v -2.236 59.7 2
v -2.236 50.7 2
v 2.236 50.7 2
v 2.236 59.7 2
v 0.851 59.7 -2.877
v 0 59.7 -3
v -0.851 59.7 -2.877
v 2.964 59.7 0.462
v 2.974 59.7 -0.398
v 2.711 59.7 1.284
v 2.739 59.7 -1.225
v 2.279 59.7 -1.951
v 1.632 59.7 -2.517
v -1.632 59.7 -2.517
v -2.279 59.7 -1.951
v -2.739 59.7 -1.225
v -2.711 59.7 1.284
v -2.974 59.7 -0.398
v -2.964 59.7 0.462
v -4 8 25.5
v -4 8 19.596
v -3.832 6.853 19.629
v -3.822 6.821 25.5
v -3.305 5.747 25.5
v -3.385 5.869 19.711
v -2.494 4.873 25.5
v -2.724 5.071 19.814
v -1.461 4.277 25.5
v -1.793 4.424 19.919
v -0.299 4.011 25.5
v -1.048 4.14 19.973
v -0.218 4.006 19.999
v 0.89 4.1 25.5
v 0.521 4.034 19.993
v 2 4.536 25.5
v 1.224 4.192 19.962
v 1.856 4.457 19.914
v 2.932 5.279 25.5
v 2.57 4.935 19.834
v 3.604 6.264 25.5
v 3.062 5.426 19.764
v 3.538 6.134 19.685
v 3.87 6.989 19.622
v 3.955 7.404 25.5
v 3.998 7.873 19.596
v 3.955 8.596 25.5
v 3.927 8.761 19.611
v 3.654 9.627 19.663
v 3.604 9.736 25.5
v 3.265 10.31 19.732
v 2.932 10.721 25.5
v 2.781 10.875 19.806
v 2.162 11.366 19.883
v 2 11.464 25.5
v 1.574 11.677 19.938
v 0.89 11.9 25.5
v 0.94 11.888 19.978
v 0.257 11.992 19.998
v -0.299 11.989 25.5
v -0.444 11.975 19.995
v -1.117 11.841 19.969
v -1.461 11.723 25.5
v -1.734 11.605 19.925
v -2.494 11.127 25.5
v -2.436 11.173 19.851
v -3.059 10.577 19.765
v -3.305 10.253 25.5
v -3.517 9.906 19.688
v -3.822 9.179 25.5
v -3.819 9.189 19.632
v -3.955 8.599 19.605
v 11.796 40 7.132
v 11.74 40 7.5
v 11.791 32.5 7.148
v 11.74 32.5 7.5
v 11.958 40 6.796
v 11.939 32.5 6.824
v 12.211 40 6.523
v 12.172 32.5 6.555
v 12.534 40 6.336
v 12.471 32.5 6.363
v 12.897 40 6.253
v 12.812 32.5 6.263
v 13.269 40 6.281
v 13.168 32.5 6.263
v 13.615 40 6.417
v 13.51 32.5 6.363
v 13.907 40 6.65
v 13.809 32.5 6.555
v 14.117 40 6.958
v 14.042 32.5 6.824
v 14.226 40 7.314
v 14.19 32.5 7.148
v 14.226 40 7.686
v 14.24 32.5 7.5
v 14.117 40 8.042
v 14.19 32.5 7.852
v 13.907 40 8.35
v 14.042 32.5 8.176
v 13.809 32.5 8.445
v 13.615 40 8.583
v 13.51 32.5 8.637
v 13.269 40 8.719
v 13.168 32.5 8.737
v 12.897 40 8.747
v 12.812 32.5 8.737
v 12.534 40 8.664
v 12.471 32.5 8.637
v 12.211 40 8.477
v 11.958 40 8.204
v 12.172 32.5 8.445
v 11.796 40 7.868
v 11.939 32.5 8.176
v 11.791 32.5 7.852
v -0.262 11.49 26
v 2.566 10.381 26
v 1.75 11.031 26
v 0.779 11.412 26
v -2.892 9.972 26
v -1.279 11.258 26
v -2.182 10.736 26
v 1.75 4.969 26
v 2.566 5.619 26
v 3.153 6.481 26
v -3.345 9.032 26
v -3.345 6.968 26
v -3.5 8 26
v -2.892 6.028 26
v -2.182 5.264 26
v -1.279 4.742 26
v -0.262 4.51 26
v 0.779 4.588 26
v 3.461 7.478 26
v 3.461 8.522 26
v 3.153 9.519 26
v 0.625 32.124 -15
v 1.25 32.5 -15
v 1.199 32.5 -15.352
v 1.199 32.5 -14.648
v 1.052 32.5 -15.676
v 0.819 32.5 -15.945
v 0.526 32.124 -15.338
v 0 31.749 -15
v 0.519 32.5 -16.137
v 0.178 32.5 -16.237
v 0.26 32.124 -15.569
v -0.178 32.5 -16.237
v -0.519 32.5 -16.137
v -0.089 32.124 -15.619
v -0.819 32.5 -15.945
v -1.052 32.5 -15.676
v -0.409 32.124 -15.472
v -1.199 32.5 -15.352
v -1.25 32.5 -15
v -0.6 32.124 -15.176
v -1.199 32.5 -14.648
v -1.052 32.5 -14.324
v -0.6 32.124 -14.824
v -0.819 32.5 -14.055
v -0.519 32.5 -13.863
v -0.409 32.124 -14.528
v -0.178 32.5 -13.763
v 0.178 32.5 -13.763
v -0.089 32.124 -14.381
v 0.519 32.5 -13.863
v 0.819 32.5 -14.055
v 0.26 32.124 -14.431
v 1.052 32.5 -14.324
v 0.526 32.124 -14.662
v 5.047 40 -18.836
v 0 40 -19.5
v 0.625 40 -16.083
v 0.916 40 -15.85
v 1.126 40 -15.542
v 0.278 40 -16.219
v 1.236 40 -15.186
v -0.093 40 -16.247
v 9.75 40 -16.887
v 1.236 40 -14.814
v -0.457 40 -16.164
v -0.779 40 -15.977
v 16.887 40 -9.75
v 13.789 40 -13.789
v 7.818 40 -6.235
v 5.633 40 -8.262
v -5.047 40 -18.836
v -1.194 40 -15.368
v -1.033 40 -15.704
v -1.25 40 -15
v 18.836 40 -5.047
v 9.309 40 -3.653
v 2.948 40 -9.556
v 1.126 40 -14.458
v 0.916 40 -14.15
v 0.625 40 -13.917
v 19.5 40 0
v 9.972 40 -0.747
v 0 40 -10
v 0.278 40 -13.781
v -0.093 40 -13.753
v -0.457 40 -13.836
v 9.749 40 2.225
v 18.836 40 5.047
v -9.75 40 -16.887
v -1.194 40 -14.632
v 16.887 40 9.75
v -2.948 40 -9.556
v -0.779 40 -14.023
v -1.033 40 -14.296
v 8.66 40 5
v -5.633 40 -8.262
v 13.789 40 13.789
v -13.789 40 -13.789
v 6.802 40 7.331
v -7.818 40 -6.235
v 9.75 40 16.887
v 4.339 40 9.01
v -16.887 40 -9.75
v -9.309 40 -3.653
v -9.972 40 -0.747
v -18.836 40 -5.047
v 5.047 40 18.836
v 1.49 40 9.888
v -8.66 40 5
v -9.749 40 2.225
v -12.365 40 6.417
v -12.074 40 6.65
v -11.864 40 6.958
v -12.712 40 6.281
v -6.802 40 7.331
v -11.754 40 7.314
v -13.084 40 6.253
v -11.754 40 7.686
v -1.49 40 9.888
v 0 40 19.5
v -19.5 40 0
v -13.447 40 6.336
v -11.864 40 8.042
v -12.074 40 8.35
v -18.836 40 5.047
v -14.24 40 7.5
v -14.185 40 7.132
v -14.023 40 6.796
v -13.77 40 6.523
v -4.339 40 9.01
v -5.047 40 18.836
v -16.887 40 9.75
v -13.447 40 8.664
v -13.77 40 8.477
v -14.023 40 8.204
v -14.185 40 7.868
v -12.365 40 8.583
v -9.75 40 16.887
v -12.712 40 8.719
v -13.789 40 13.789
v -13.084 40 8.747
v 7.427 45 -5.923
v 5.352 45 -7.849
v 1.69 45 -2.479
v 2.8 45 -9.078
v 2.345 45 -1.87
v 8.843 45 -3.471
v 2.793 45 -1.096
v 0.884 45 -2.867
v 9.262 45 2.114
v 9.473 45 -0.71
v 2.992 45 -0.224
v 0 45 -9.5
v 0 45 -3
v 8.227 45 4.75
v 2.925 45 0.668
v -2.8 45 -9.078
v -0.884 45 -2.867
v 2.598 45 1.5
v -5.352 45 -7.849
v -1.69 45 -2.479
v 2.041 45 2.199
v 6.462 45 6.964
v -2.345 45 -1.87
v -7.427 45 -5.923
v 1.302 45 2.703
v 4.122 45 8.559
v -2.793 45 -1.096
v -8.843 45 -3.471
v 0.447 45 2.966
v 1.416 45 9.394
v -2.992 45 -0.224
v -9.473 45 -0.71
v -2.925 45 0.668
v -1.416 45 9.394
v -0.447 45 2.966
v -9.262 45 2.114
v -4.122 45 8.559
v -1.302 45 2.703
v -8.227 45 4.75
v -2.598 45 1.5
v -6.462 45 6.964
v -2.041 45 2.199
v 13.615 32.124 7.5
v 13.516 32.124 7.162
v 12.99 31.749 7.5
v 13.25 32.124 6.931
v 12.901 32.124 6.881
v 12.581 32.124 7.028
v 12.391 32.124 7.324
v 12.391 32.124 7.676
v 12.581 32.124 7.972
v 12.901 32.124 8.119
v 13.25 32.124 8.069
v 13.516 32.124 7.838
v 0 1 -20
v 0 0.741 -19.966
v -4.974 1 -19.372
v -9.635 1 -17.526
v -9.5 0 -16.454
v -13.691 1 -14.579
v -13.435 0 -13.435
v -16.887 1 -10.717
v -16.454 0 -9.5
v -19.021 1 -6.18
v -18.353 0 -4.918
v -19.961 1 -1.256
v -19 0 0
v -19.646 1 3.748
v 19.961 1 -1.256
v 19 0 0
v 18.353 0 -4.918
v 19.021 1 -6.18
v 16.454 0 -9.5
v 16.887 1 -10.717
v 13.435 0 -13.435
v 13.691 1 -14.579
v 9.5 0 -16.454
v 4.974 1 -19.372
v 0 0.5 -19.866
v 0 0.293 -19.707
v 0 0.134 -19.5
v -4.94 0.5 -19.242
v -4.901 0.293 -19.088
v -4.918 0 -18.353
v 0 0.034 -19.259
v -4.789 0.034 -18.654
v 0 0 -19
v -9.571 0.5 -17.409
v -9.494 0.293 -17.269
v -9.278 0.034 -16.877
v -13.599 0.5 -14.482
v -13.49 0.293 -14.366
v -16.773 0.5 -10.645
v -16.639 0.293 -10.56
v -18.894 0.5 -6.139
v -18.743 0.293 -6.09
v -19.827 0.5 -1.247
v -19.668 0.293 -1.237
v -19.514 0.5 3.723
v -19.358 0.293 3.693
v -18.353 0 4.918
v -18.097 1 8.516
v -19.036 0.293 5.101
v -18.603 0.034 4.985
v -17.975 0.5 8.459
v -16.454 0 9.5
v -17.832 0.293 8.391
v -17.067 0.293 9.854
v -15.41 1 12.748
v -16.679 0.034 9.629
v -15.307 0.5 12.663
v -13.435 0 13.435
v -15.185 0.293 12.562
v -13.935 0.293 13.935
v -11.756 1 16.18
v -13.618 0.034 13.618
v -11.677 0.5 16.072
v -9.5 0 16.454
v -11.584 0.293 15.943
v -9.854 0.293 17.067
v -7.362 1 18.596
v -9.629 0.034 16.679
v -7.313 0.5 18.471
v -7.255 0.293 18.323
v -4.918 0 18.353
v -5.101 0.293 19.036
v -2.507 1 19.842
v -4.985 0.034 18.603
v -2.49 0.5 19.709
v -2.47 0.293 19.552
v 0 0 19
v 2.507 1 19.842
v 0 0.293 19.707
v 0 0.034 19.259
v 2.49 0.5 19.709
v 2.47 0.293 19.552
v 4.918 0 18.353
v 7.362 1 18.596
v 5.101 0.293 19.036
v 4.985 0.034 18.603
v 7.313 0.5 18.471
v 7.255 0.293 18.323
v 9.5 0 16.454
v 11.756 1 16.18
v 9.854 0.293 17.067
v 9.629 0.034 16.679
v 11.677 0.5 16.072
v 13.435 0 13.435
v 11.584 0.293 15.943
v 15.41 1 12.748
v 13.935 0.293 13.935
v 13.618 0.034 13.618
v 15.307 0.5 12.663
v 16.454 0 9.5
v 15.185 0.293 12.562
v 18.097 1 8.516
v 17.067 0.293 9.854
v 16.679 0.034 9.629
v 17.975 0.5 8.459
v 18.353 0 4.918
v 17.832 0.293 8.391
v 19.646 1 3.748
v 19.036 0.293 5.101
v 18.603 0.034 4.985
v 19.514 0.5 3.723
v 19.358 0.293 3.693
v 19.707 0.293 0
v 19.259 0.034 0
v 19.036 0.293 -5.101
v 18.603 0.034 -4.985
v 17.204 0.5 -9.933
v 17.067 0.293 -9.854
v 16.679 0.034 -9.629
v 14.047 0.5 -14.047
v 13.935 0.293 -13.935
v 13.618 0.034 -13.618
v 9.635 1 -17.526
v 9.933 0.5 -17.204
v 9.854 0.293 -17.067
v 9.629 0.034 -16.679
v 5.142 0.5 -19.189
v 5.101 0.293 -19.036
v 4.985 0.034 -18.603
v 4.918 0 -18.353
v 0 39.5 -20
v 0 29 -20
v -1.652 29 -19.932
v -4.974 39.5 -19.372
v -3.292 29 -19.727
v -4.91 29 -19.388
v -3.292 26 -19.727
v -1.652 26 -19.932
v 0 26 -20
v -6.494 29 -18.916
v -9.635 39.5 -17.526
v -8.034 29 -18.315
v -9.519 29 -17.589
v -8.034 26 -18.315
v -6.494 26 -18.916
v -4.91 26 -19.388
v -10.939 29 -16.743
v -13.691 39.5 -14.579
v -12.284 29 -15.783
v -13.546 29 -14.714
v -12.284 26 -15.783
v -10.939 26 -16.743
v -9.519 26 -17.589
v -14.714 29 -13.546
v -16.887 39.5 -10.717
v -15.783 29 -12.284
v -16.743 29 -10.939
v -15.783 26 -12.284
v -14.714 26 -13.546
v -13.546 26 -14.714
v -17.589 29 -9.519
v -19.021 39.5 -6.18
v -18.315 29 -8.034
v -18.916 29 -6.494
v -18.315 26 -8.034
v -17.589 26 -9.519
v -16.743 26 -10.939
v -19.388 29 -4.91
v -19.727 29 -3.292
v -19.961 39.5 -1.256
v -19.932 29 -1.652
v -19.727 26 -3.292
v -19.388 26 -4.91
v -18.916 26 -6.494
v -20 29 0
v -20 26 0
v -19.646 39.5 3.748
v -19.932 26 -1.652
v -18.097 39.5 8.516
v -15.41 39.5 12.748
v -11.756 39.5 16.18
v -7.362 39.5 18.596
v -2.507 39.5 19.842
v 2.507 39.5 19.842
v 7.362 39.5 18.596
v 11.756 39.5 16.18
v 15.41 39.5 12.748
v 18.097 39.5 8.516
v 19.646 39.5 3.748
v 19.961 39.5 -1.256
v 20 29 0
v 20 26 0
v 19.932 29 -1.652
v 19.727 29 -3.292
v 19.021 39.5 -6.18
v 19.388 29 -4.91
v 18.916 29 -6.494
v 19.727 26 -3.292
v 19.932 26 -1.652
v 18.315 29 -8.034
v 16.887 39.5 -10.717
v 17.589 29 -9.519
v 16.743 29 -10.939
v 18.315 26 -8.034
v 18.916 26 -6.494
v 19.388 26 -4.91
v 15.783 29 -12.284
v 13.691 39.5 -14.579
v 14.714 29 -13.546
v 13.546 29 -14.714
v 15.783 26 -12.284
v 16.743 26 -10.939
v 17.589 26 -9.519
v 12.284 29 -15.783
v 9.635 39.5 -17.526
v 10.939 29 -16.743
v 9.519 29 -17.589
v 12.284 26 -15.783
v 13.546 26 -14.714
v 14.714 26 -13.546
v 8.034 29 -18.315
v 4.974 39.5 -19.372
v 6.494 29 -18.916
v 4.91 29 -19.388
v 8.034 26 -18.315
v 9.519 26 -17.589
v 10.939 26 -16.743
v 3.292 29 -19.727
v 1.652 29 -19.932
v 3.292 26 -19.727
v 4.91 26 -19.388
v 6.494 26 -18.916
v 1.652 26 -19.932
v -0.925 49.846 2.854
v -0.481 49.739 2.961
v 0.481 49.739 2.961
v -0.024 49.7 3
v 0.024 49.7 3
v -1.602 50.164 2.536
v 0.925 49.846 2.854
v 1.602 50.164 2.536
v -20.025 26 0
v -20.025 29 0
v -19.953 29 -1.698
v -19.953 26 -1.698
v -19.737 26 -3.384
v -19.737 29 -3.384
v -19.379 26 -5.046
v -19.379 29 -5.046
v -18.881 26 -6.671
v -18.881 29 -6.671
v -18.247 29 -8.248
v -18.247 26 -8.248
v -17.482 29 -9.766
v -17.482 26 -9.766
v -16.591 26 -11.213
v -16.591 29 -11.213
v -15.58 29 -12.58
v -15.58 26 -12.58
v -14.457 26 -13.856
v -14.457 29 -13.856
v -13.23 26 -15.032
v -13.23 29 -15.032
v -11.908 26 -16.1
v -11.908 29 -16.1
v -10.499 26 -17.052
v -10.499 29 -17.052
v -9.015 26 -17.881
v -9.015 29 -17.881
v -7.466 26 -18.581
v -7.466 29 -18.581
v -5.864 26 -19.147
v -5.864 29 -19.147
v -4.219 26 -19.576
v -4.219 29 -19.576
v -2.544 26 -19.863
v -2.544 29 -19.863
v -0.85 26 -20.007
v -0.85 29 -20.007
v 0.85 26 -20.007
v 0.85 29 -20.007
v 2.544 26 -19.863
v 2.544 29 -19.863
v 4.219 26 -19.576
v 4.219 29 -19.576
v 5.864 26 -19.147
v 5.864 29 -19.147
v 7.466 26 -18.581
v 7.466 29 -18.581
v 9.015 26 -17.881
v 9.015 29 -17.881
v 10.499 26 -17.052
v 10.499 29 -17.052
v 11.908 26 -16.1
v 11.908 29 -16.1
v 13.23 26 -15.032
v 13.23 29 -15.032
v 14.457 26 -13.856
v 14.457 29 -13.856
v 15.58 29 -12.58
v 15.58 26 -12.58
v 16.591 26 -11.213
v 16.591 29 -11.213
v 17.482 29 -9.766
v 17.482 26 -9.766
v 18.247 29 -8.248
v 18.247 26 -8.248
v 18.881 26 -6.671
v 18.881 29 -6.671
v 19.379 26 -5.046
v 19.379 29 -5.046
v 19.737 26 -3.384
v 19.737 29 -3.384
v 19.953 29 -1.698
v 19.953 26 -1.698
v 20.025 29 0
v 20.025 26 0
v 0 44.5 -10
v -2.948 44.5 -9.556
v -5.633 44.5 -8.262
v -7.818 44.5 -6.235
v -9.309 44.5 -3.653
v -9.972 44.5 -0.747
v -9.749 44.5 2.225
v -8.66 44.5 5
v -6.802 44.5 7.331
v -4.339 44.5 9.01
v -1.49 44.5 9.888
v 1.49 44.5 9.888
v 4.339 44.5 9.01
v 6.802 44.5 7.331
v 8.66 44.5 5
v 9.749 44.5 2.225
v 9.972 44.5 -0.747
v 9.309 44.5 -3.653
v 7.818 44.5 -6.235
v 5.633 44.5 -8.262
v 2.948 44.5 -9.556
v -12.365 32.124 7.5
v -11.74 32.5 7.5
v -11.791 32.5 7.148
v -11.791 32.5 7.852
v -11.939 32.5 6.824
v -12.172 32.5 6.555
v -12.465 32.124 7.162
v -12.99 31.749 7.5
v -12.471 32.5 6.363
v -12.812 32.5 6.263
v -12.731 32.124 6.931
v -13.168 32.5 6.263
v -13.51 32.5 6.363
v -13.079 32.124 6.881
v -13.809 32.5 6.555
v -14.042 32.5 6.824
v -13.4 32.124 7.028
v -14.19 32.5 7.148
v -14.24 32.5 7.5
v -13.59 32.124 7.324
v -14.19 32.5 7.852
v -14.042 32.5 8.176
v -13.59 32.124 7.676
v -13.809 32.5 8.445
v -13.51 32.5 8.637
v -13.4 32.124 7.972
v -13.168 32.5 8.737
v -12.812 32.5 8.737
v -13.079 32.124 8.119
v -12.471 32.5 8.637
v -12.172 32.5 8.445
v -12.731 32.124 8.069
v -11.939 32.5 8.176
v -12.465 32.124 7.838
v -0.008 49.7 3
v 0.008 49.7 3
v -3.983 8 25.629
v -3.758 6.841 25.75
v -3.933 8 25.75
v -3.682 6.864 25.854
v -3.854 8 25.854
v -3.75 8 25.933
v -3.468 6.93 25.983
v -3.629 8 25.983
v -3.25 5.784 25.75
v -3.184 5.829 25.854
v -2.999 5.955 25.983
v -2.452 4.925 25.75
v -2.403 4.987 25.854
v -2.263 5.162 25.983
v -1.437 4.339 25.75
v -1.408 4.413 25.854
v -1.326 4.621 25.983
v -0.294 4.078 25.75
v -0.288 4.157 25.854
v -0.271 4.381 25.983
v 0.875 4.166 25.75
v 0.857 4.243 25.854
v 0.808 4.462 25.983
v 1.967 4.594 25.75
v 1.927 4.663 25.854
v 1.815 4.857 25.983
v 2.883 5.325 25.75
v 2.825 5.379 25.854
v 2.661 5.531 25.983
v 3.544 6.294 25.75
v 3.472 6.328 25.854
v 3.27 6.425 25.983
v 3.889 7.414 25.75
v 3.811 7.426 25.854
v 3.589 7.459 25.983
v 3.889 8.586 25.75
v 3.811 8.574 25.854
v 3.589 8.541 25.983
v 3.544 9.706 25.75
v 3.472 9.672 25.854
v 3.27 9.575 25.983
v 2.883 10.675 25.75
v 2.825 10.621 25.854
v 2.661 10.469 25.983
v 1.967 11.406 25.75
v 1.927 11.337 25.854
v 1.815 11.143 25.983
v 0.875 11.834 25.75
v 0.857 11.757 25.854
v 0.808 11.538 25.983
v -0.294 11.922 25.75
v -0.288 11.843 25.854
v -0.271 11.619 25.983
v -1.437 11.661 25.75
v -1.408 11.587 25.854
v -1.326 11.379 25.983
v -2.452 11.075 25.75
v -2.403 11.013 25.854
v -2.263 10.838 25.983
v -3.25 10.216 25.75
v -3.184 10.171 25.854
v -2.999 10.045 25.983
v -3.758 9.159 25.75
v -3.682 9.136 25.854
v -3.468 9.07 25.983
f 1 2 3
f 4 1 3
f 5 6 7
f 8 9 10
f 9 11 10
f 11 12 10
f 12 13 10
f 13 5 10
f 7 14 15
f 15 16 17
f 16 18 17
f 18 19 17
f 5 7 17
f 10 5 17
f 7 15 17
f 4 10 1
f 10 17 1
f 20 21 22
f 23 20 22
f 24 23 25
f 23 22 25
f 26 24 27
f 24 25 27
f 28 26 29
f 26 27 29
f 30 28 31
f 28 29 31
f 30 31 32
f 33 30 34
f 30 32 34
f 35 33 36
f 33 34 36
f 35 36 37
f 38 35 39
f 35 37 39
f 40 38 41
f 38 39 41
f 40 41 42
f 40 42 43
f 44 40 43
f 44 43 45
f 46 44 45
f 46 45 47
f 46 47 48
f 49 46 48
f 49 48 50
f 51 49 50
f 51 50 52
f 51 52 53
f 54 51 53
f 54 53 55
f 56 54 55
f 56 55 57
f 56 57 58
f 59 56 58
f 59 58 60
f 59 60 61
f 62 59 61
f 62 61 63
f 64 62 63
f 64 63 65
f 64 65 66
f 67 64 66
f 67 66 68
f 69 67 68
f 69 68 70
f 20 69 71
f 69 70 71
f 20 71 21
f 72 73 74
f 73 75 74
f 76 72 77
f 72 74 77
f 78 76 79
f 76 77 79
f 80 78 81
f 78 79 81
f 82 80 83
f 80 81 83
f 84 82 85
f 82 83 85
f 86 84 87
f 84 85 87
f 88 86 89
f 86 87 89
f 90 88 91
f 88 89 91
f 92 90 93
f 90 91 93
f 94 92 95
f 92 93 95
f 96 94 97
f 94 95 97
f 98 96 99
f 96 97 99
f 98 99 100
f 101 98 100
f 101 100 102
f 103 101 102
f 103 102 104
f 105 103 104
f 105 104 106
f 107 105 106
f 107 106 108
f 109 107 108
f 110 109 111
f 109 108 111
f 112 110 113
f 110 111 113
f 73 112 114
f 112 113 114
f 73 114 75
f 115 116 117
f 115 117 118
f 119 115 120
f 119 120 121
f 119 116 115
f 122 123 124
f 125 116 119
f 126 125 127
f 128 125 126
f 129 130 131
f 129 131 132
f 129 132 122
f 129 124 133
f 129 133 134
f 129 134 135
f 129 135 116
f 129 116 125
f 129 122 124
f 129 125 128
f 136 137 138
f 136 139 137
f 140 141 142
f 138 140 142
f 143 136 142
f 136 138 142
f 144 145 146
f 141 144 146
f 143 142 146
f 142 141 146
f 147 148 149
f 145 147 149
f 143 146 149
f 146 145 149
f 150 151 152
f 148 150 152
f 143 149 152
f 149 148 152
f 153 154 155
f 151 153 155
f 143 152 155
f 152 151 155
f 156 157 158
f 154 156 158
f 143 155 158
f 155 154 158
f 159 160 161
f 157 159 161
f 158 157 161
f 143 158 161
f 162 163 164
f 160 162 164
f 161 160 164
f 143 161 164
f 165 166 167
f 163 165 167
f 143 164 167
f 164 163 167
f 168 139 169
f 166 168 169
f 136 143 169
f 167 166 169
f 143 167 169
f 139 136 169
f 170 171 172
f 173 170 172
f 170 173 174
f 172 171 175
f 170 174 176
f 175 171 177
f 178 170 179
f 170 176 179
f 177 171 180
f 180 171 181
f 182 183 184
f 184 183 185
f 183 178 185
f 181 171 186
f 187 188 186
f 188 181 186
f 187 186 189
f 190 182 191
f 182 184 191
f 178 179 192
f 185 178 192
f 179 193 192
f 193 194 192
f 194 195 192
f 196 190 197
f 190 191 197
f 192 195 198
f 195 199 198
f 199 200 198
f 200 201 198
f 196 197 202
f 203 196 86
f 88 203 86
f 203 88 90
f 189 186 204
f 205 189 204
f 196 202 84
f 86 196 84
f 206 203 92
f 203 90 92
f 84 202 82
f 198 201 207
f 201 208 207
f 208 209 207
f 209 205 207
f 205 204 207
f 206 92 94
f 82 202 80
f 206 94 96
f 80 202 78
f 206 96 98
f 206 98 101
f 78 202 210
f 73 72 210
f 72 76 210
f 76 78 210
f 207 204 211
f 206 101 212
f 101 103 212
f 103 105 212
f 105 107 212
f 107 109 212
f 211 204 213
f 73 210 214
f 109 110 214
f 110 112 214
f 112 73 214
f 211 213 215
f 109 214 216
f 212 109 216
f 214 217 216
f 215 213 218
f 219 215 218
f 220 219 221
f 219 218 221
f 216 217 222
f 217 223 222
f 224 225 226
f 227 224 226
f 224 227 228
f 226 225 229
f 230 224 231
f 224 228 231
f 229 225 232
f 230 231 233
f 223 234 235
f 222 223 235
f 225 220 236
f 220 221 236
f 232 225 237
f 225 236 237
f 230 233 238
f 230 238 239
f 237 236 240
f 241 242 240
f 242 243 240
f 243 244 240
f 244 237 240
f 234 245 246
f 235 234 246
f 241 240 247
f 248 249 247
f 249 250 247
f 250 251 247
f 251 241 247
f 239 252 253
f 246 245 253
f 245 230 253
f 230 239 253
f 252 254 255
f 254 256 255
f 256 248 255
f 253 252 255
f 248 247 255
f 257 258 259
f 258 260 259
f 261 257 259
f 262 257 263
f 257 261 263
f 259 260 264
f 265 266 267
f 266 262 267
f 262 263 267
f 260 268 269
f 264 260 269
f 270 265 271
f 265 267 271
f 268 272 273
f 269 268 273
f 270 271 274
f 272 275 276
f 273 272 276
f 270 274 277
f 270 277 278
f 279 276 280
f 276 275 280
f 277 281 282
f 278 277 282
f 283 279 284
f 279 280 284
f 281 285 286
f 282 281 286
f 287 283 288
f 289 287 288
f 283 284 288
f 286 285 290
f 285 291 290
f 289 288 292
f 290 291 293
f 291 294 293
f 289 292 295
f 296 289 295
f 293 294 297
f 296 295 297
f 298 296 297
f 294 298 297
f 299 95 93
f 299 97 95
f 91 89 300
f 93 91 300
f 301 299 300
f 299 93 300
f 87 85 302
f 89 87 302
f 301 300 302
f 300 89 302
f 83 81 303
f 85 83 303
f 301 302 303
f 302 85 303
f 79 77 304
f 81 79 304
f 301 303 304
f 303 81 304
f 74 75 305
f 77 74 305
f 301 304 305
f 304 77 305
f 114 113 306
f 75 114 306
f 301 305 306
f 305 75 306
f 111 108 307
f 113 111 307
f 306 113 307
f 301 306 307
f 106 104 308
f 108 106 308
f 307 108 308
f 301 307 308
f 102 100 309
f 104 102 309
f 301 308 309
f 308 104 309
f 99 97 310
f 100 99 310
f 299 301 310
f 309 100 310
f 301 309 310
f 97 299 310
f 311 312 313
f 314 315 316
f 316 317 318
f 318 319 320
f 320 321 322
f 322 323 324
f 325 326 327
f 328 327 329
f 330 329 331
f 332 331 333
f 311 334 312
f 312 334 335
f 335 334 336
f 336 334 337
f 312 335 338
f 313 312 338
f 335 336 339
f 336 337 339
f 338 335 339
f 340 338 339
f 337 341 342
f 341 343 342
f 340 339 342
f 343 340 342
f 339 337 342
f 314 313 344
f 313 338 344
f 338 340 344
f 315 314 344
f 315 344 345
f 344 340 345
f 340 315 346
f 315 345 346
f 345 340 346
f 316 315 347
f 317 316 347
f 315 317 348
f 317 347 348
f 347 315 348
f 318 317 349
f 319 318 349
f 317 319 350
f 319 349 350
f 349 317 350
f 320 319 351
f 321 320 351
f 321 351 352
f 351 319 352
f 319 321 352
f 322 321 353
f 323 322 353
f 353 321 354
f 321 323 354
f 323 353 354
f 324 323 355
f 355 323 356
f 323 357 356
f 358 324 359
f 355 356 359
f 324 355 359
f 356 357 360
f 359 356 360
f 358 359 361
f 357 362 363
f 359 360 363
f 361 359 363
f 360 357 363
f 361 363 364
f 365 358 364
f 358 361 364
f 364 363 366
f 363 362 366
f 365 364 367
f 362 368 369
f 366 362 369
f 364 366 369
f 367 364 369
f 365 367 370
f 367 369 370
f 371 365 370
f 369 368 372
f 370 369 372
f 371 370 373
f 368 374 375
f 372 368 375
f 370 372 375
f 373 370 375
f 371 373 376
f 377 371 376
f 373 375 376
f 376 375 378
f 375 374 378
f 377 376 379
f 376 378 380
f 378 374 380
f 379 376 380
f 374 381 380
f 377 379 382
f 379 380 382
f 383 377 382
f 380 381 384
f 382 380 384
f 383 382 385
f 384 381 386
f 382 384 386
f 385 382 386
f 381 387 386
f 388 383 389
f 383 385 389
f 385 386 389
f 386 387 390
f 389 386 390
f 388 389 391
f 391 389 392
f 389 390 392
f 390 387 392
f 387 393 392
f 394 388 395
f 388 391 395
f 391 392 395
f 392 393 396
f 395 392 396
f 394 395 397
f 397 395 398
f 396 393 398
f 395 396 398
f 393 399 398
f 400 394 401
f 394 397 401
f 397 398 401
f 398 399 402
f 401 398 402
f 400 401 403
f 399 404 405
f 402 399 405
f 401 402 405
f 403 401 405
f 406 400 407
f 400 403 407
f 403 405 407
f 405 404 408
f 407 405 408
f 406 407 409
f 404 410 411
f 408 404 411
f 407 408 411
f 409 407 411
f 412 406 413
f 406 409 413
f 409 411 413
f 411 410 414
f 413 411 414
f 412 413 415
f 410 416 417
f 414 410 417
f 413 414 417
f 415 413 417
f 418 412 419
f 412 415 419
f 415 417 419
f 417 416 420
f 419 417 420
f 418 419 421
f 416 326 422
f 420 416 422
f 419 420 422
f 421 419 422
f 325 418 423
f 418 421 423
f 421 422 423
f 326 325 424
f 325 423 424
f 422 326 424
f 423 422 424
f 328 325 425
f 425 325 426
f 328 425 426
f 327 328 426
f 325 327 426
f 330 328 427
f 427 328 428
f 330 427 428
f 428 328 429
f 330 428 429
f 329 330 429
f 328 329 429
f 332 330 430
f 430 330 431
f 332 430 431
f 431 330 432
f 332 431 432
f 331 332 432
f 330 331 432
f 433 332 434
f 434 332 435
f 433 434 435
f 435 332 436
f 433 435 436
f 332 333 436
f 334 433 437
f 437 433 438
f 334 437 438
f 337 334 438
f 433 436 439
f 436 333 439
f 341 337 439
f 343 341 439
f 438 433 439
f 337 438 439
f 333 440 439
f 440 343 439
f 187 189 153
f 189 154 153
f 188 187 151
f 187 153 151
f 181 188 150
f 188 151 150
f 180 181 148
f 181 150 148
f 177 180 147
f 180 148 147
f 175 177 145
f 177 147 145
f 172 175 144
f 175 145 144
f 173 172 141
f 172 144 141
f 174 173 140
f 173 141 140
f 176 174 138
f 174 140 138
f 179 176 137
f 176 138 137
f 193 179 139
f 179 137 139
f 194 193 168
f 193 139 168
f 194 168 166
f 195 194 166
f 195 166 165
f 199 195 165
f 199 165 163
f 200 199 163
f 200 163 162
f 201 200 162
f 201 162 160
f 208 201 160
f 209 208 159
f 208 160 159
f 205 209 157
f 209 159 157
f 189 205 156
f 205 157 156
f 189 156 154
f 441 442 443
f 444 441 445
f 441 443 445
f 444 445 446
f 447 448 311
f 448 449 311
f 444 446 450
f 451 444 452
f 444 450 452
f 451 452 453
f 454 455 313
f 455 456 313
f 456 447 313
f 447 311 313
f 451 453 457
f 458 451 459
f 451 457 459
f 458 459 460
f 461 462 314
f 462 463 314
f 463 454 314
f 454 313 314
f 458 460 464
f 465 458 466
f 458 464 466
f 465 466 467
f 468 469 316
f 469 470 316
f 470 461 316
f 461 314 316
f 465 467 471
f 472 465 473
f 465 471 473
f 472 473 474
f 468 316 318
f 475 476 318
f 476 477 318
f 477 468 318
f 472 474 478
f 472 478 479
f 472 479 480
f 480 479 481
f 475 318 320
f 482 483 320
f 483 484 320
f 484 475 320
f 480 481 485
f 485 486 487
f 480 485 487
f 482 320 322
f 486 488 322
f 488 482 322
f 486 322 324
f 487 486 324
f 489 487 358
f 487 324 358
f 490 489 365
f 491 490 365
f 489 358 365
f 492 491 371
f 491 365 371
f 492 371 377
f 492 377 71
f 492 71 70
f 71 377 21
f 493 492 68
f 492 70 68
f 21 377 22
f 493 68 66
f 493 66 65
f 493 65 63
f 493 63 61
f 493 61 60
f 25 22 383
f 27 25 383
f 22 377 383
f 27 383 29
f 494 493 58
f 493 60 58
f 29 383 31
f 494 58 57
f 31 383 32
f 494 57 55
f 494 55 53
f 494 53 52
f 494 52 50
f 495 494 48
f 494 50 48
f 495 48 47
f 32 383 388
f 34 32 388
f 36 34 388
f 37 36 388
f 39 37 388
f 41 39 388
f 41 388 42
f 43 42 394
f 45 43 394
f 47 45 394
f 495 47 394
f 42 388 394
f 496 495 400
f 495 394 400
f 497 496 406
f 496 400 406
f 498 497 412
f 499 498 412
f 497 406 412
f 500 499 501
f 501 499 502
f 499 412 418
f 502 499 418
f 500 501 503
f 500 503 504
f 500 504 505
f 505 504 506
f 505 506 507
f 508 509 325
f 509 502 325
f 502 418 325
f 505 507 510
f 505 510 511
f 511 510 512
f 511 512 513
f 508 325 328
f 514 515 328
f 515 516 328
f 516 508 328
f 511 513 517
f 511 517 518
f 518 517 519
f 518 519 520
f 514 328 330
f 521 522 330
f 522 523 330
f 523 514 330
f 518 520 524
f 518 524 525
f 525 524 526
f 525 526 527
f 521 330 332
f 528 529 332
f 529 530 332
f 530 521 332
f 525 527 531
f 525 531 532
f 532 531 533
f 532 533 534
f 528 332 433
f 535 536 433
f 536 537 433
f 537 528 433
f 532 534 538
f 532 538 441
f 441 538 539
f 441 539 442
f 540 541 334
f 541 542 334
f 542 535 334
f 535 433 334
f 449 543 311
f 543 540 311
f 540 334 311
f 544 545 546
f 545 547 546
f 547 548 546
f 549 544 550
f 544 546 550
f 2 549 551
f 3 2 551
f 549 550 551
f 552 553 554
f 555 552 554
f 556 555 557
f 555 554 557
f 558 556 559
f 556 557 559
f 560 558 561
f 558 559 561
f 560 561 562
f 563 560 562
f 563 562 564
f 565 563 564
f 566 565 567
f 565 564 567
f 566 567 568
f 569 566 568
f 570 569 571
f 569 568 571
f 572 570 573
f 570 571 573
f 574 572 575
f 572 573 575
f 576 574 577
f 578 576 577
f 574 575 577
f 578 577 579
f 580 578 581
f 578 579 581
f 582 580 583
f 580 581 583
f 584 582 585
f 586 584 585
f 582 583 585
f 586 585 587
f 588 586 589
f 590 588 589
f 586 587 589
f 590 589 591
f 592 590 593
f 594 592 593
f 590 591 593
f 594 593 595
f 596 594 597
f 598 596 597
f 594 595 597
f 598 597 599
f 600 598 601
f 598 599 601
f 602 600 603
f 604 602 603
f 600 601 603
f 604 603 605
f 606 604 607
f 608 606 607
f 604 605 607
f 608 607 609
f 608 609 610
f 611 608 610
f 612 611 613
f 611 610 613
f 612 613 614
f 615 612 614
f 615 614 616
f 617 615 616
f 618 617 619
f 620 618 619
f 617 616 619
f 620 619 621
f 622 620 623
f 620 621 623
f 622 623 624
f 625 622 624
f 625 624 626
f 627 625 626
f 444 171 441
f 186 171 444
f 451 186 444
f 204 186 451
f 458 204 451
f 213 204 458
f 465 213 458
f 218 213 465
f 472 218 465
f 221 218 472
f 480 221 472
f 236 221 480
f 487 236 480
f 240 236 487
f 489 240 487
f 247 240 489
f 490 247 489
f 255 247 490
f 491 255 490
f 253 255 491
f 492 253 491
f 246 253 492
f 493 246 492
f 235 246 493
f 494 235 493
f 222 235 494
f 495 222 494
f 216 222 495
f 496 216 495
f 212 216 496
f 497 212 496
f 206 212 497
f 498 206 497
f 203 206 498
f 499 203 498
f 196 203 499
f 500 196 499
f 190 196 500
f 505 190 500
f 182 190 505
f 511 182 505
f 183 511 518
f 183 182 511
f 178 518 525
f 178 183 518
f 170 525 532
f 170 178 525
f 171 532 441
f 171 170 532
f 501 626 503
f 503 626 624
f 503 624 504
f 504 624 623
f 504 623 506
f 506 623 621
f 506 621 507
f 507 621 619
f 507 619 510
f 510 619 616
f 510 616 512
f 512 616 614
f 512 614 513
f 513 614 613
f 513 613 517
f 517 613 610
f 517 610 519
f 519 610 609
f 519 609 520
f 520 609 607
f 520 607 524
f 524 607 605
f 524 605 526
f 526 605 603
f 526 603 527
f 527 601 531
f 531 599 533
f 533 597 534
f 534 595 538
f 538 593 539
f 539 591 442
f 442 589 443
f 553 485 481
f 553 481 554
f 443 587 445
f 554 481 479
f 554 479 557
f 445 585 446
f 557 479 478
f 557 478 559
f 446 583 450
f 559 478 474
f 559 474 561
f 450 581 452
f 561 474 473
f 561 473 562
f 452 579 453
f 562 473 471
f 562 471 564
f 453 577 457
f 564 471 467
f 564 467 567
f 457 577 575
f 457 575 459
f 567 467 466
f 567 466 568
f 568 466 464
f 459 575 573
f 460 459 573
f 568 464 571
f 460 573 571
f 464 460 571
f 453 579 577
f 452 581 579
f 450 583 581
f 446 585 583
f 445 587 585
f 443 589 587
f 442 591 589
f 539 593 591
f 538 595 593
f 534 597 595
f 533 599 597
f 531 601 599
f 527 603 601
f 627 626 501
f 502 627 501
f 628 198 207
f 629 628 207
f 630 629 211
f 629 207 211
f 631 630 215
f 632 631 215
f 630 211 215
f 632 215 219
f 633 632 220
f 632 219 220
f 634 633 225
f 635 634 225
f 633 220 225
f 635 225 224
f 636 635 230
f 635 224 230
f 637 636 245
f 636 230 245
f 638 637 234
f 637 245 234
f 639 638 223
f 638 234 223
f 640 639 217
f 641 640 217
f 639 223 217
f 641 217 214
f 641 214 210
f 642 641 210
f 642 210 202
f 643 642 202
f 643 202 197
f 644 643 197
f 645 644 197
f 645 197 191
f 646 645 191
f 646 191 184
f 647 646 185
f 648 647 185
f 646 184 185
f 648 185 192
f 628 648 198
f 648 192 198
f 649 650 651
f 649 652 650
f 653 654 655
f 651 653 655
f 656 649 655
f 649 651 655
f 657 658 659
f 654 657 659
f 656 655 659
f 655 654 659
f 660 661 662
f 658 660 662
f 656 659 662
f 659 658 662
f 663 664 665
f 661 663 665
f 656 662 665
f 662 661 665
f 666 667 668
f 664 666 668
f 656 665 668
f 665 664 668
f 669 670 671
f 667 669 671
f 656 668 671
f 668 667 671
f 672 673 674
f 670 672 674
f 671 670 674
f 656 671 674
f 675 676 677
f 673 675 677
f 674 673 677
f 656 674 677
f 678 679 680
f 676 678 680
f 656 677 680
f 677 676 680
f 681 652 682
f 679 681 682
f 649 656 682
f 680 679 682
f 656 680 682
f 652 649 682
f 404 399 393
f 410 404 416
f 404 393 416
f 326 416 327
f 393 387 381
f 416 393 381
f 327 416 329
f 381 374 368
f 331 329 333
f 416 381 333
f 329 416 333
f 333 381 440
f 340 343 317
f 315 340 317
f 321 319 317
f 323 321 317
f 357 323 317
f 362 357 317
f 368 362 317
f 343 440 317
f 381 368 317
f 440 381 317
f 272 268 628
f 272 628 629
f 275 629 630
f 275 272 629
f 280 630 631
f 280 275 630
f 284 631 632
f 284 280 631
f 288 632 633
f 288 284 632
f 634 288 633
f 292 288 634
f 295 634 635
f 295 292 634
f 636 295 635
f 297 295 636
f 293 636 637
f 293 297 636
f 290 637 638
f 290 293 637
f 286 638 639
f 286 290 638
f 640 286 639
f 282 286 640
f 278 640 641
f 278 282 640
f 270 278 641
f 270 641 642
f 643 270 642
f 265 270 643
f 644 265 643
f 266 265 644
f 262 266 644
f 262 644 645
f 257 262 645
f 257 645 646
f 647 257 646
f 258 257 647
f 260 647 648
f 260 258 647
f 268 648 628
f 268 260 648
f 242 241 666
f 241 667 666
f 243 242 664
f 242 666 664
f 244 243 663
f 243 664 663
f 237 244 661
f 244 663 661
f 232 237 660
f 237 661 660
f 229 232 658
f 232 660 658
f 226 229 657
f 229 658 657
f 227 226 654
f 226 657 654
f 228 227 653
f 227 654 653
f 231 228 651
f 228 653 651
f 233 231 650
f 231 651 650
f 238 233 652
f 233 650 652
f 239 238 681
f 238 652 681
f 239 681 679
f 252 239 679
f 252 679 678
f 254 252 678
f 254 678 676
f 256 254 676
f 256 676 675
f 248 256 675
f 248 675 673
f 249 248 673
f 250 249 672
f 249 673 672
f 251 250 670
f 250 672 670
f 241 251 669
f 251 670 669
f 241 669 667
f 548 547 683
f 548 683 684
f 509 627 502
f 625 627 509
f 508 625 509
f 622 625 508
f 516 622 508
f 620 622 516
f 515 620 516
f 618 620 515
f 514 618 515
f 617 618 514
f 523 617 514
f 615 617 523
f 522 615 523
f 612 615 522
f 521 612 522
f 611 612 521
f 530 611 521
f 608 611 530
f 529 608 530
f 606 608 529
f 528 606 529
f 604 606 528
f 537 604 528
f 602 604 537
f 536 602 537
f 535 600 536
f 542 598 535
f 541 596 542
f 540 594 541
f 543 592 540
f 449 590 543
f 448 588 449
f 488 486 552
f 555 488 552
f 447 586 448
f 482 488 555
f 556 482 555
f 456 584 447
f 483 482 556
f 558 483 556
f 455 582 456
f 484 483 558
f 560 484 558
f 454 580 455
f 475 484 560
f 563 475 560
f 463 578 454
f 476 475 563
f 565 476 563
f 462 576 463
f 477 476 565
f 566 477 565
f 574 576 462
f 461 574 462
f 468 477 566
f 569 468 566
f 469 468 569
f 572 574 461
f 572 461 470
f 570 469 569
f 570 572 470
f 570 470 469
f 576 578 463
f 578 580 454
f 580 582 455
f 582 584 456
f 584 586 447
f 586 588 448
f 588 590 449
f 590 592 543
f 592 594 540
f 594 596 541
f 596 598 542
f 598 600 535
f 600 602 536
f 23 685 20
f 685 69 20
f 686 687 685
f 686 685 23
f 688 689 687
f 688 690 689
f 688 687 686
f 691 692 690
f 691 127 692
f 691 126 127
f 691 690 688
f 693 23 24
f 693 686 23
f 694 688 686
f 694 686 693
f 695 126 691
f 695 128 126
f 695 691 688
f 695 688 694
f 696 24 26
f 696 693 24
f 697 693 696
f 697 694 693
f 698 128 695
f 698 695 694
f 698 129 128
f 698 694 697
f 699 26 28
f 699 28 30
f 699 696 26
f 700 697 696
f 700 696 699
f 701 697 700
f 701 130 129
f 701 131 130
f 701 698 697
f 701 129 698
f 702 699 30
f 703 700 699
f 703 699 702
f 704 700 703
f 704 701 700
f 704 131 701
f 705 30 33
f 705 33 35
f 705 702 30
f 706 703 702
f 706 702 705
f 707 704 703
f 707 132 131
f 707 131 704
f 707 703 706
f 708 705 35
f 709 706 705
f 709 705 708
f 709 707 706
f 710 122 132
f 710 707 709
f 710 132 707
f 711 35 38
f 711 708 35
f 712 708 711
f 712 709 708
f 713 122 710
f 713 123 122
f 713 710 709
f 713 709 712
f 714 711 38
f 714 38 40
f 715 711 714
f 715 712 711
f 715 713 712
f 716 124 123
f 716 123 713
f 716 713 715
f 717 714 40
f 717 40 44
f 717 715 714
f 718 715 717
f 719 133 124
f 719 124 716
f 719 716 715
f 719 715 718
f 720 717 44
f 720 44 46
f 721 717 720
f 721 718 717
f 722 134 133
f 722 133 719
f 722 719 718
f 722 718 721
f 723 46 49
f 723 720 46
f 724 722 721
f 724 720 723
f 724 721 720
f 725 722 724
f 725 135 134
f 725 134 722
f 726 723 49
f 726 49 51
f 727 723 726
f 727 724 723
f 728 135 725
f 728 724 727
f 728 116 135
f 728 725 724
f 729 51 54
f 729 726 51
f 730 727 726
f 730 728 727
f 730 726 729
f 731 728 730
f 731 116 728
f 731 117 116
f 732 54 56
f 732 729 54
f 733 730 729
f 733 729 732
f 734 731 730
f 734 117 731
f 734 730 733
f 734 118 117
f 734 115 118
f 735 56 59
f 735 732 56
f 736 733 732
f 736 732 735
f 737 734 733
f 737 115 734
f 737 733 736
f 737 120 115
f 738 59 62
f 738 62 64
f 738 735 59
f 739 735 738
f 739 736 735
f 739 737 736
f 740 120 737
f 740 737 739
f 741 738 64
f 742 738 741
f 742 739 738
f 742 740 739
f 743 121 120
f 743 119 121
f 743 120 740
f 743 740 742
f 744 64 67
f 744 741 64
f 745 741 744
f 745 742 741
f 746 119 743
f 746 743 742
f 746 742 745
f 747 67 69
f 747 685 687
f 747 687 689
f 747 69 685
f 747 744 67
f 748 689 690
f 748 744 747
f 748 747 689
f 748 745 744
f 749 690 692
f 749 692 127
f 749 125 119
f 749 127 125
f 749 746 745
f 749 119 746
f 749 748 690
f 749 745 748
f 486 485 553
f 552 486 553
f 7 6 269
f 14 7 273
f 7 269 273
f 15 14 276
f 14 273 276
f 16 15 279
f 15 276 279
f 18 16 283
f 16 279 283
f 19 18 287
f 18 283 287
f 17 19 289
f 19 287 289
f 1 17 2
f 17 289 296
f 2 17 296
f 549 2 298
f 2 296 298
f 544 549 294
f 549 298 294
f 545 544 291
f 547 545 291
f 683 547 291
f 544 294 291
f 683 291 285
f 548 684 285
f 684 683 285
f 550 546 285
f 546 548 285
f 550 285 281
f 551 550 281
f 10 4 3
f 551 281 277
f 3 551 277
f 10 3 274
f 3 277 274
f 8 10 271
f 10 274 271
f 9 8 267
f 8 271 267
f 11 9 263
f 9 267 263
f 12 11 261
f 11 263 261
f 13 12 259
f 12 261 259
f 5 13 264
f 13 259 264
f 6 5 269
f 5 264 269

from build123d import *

# Parameters (mm, degrees)
SKETCH_2_W             = 16.970483697
SKETCH_2_H             = 5.016620159
CUT_EXTRUDE_1_DEPTH    = 10
CHAMFER_1_SIZE         = 1
SKETCH_3_R             = 4
EXTRUDE_1_DEPTH        = 26
FILLET_1_R             = 1
FILLET_2_R             = 0.5
CHAMFER_2_SIZE         = 0.5
HOLE_WIZARD_M3_1_D     = 2.5
HOLE_WIZARD_M3_1_DEPTH = 7.5
HOLE_WIZARD_M3_1_TIP   = 0.751075774
EXTRUDE_2_DEPTH        = 3


with BuildPart() as part:
    # 草图1 → 旋转1 (revolve)
    with BuildSketch(Plane.XY, mode=Mode.PRIVATE) as revolve_1_sk:
        Polygon((0, 0), (0, 59.7), (3, 59.7), (3, 45), (10, 45), (10, 40), (20, 40), (20, 0), align=None)
    revolve(revolve_1_sk.sketch.rotate(Axis((0, 0, 0), (0, 1, 0)), 90), axis=Axis((0, 0, 0), (0, 1, 0)))

    # 草图2 → 切除-拉伸1 (cut)
    with BuildSketch(Plane(origin=(0, 59.7, 0), x_dir=(1, 0, 0), z_dir=(0, 1, 0))):
        with Locations((-1.985722867, -4.50831008)):
            Rectangle(SKETCH_2_W, SKETCH_2_H)
    extrude(amount=-CUT_EXTRUDE_1_DEPTH, mode=Mode.SUBTRACT)

    # 倒角1
    chamfer_1_edges = [part.edges().sort_by_distance(p)[0] for p in [
        (0, 49.7, 2),
    ]]
    chamfer(chamfer_1_edges, length=CHAMFER_1_SIZE - 0.0001)  # a hair under: the kernel refuses the full size

    # 草图3 → 凸台-拉伸1 (add)
    with BuildSketch(Plane.XY):
        with Locations(Location((0, 8, 0), (0, 0, 180))):
            Circle(SKETCH_3_R)
    extrude(amount=EXTRUDE_1_DEPTH)

    # 圆角1
    fillet_1_edges = [part.edges().sort_by_distance(p)[0] for p in [
        (0, 0, 20),
    ]]
    fillet(fillet_1_edges, radius=FILLET_1_R)

    # 圆角2
    fillet_2_edges = [part.edges().sort_by_distance(p)[0] for p in [
        (4, 8, 26),
    ]]
    fillet(fillet_2_edges, radius=FILLET_2_R)

    # 倒角2
    chamfer_2_edges = [part.edges().sort_by_distance(p)[0] for p in [
        (0, 40, 20),
        (0, 45, 10),
    ]]
    chamfer(chamfer_2_edges, length=CHAMFER_2_SIZE)

    # M3 螺纹孔1
    with Locations(Plane(origin=(0, 40, 0), x_dir=(1, 0, 0), z_dir=(0, 1, 0))):
        with Locations((-12.990381057, -7.5), (12.990381057, -7.5), (0, 15)):
            Hole(HOLE_WIZARD_M3_1_D / 2, depth=HOLE_WIZARD_M3_1_DEPTH)
            with Locations((0, 0, -(HOLE_WIZARD_M3_1_DEPTH + HOLE_WIZARD_M3_1_TIP / 2))):  # 118° drill point
                Cone(0, HOLE_WIZARD_M3_1_D / 2, HOLE_WIZARD_M3_1_TIP, mode=Mode.SUBTRACT)

    # 草图8 → 凸台-拉伸2 (add)
    with BuildSketch(Plane(origin=(0, 29, 0), x_dir=(1, 0, 0), z_dir=(0, 1, 0))):
        with BuildLine():
            Line((20.025, 0), (-20.025, 0))
            ThreePointArc((-20.025, 0), (0, 20.025), (20.025, 0))
        make_face()
    extrude(amount=-EXTRUDE_2_DEPTH)


solid = part.part
